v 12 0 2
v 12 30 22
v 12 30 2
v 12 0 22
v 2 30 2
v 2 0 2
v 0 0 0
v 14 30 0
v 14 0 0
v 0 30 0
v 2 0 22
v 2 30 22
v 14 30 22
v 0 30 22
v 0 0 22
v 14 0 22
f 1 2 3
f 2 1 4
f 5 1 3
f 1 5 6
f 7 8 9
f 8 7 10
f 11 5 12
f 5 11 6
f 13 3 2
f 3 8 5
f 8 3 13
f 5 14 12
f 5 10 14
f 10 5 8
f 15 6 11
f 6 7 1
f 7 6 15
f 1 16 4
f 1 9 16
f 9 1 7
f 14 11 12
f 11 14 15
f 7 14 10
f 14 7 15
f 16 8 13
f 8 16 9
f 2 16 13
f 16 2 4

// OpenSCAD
// w: width of u
// h: height of u
// l: length of the model
// t: the thickness
module ushape(w, h, l, t) {
    translate([t, 0, 0])
    union() {
        cube([w, l, t]);

        translate([-t, 0, 0])
        cube([t, l, h+t]);

        translate([w, 0, 0])
        cube([t, l, h+t]);
    }
}

ushape(10, 20, 30, 2);
